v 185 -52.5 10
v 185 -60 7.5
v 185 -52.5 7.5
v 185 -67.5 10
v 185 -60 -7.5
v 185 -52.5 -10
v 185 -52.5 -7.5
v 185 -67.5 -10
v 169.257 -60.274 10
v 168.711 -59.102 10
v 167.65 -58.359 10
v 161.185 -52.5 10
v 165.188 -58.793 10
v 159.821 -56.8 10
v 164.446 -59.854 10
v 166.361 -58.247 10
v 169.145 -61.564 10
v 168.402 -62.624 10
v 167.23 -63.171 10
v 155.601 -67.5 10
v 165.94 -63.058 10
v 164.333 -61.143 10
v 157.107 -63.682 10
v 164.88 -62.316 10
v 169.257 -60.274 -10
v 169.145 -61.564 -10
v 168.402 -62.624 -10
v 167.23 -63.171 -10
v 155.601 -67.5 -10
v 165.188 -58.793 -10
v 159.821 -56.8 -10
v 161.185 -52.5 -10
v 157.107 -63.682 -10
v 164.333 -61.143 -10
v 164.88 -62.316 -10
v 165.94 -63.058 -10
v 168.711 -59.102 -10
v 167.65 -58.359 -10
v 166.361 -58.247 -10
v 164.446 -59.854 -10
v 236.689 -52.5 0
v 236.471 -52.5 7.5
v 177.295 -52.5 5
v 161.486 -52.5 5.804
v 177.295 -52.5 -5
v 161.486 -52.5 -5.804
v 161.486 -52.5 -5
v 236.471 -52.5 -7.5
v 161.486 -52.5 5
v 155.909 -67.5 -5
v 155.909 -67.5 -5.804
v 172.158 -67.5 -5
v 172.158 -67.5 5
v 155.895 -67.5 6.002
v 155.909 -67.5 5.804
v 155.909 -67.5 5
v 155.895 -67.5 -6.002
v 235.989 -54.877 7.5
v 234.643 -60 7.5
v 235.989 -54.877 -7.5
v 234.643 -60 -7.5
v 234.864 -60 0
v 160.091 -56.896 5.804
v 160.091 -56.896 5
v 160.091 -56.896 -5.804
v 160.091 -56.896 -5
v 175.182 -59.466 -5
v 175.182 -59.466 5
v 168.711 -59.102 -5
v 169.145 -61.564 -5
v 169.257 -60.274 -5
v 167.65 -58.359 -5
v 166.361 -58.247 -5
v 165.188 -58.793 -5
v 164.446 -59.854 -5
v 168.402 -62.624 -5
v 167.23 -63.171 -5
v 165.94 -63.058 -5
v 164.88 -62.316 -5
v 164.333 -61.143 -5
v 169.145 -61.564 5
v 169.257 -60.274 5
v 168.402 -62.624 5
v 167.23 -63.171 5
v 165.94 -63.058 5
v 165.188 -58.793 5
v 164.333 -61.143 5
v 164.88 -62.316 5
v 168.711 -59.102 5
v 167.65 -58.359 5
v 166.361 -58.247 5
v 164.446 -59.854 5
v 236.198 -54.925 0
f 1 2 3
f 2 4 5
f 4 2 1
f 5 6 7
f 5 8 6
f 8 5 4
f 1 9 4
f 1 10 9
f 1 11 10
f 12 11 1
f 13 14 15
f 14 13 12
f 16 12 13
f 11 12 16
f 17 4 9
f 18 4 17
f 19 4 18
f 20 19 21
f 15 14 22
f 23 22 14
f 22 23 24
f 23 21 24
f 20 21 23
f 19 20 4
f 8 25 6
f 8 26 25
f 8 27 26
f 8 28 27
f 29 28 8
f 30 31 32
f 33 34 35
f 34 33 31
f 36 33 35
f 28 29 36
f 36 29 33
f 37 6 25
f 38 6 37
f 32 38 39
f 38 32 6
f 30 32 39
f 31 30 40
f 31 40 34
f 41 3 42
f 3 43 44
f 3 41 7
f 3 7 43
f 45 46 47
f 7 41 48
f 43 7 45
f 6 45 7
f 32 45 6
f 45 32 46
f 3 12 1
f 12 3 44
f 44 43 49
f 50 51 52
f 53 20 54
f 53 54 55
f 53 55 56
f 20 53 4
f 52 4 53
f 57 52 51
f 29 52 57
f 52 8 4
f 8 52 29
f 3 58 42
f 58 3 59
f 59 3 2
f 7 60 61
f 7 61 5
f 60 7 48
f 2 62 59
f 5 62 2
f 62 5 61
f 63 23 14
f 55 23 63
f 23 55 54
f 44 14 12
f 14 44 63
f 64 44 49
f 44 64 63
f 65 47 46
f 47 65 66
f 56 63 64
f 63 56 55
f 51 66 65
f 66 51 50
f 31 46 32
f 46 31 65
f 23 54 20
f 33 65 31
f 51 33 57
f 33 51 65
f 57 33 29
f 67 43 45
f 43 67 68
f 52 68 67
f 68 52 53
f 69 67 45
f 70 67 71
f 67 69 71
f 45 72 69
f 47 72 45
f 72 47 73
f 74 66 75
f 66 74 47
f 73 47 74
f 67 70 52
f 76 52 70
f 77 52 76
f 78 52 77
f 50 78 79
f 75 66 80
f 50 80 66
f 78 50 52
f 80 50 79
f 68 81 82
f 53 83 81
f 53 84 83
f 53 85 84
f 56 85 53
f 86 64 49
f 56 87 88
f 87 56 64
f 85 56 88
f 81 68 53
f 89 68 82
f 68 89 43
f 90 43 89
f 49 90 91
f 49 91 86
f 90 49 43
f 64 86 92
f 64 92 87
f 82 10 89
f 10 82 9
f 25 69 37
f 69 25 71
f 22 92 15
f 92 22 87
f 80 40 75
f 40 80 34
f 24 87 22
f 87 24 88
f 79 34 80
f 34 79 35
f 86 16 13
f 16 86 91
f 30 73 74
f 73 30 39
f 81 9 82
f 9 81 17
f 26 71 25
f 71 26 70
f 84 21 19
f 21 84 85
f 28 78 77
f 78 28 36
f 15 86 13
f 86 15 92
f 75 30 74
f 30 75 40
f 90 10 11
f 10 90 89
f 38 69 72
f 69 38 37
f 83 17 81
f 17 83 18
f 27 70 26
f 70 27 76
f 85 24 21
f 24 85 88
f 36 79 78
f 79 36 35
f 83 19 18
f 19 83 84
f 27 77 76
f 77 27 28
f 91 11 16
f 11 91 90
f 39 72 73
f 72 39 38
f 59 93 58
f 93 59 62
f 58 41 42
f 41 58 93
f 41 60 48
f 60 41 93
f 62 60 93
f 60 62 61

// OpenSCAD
// file: ../motors/MN5212.scad
use <../utils.scad>

module MN5212(){

	render(){
		translate([0,0, 42.5 / 2 - 23 / 2 - 4.9 - 6])
			cylinder(
				h = 23,
				r = 59 / 2,
				$fa = fa(59 / 2),
				center = true);
		translate([0,0, 42.5 / 2 - 4.9 / 2 - 6])
			cylinder(
				h = 4.9,
				r1 = 59 / 2,
				r2 = 24.8 / 2,
				$fa = fa(59 / 2),
				center = true);
		translate([0,0, - 42.5 / 2 + 5.6 / 2 + 3])
			cylinder(
				h = 5.6,
				r1 = 44 / 2,
				r2 = 59 / 2,
				$fa = fa(59 / 2),
				center = true);
		translate([0, 0, 42.5 / 2 - 3])
			cylinder(
				h = 6,
				r = 4 / 2,
				$fa = fa(4 / 2),
				center = true);
		translate([0, 0, - 42.5 / 2 + 1.5])
			cylinder(
				h = 3,
				r = 6 / 2,
				$fa = fa(6 / 2),
				center = true);
	}

}
// file: ../servos/HS_5065MG.scad
use <../utils.scad>

module HS_5065MG(){

	length = 23.75;
	width = 11.68;
	depth = 20.32;
	wing_width = 32.38;
	wing_thick = 3.43;
	shaft_offset = 6;
	hole_spacing = 28.32;
	shaft_height = 26.16;
	shaft_length = 2;

	module mounting_hole(){
		mh_rad = 2 / 2;
		translate(
			[
				hole_spacing / 2,
				0,
				depth / 2 - wing_thick / 2
			])
			cylinder(h = 5, r = mh_rad, $fa = fa(mh_rad), center = true);
	}

	difference(){
		union(){
			cube([length, width, depth], center = true);
			translate([0, 0, depth / 2 - wing_thick / 2])
				cube([wing_width, width, wing_thick], center = true);
			translate(
				[
					- length / 2 + shaft_offset,
					0,
					shaft_height - length / 2 + shaft_length / 2
				])
				cylinder(
					h = shaft_length,
					r = 1.5,
					$fa = fa(1.5),
					center = true);
		}	union(){

			mounting_hole();
			mirror() mounting_hole();
		}
	}
}

HS_5065MG();
// file: ../servos/LS_0006_servo.scad
// Author Michael Marques (DrYerzinia)

use <../utils.scad>

module ls_0006_servo(){
	
	length = 21.4;
	depth = 19.9;
	thickness = 11.65;

	gear_height = 2.6;
	gear_bump_height = 0.7;
	gear_bump_diameter = 1.97;
	gear_outer_bump_diameter = 6;
	gear_bump_offset = 12.2;

	shaft_height = 2.4;
	shaft_diameter = 3.74;
	shaft_offset = thickness / 2;
	shaft_screw_diameter = 1.3;
	
	wing_outer_width = 8.5;
	wing_top_off = 3.8;
	wing_length = 3.8;
	wing_thickness = 1.2;
	wing_hole_diameter = 1.85;
	wing_hole_edge_dist = 2;

	module wing_hole(){
		translate(
			[
				length / 2 + wing_hole_edge_dist,
				0,
				depth/2 - wing_top_off - wing_thickness / 2
			])
			cylinder(
				h = wing_thickness + 1,
				r = wing_hole_diameter / 2,
				$fn = 16,
				center = true);
	}

	module wing(){
		translate(
			[
				length / 2,
				thickness / 2,
				depth/2 - wing_top_off - wing_thickness
			])
			rotate([0,0,-90])
				trapezoid(
					thickness,
					wing_outer_width,
					wing_length,
					wing_thickness);
	}

	// Body
	cube([length, thickness, depth], center = true);

	difference(){
		union(){

			wing();
			mirror() wing();

			// Gear Bumps
			translate([0, 0, depth/2 + gear_height / 2]){
				translate([length / 2 - gear_bump_offset, 0, 0])
					cylinder(
						h = gear_height,
						r = gear_outer_bump_diameter / 2,
						$fn = 16,
						center = true);
				translate([length / 2 - gear_bump_offset, 0, gear_height/2 + gear_bump_height / 2])
					cylinder(
						h = gear_bump_height,
						r = gear_bump_diameter / 2,
						$fn = 16,
						center = true);
				translate([length / 2 - shaft_offset, 0, 0])
					cylinder(
						h = gear_height,
						r = thickness / 2,
						$fn = 32,
						center = true);
				// Shaft
				translate([length / 2 - shaft_offset, 0, gear_height])
					cylinder(
						h = shaft_height,
						r = shaft_diameter / 2,
						$fn = 16,
						center = true);
			}

		}
		union(){

			wing_hole();
			mirror() wing_hole();

			// Shaft_hole
			translate(
				[
					length / 2 - shaft_offset,
					0,
					depth/2 + gear_height * (3 / 2) + 0.5])
				cylinder(
					h = shaft_height + 1,
					r = shaft_screw_diameter / 2,
					$fn = 16,
					center = true);

		}
	}

}

module translate_ls_0006_attachment(){

	length = 21.4;
	thickness = 11.65;
	shaft_offset = thickness / 2;
	depth = 19.9;
	float = 3.3;

	translate([length / 2 - shaft_offset, 0, depth / 2 + float])
		children();

}

module bar_attachment(){

	height = 3.75;
	bar_length = 14.7;
	bar_thickness = 1.6;
	inner_radius = 5.9;
	outer_radius = 3.95;
	shaft_diameter = 3.7;
	upper_void_diameter = 4.8;
	screw_diameter = 2;
	hole_spacing = 2;
	hole_4_diameter = 1.2;
	hole_diameter = 1;
	hole_start_off = 4.7;
	top_void_depth = 0.67;
	bottom_void_depth = 1.84;

	translate([0, 0, height / 2]){
		difference(){
			union(){

				translate([0, inner_radius / 2, height / 2 - bar_thickness])
					rotate([0,0,-90])
						trapezoid(
							inner_radius,
							outer_radius,
							bar_length,
							bar_thickness);

				cylinder(
					h = height,
					r = inner_radius / 2,
					$fn = 16,
					center = true);

				translate([bar_length, 0, height / 2 - bar_thickness / 2])
					cylinder(
						h = bar_thickness,
						r = outer_radius / 2,
						$fn = 16,
						center = true);

			}
			union(){
				// screwhole
				cylinder(
					h = height + 1,
					r = screw_diameter / 2,
					$fn = 16,
					center = true);
				// voids
				translate([0, 0, height / 2 - top_void_depth / 2 + 0.5])
					cylinder(
						h = top_void_depth + 1,
						r = upper_void_diameter / 2,
						$fn = 16,
						center = true);
				translate([0, 0,  - bottom_void_depth / 2 - 0.5])
					cylinder(
						h = bottom_void_depth + 1,
						r = shaft_diameter / 2,
						$fn = 16,
						center = true);

				for(i = [0:4]){
					dia = (i != 3) ? hole_diameter : hole_4_diameter;
					translate(
						[
							hole_start_off + hole_spacing * i,
							0,
							height / 2 - bar_thickness / 2])
						cylinder(
							h = bar_thickness + 1,
							r = dia / 2,
							$fn = 16,
							center = true);
				}

			}
		}
	}

}

ls_0006_servo();
translate_ls_0006_attachment() bar_attachment();
// file: ../servos/parallax_continuous_rotation_servo.scad
// Author Michael Marques (DrYerzinia)

module parallax_continuous_rotation_servo(){

	depth = 37.7;
	length = 40.75;
	width = 19.75;

	mount_height = 2.7;
	mount_extent = 6.1;
	mount_from_top = 7.7;

	mount_hole_diameter = 4.46;
	mount_hole_spacing = 14.4 - mount_hole_diameter;

	shaft_diameter = 5.8;
	shaft_offset = 10;
	shaft_length = 3.5;

	module mounting_hole(){

			translate(
				[
					length / 2 + 5,
					mount_hole_spacing / 2,
					depth / 2 - mount_height / 2 - mount_from_top
				]
				)
				cylinder(
					h = mount_height + 1,
					r = mount_hole_diameter / 2,
					$fn=16,
					center = true);
	}

	difference(){
		union(){

			// Body
			cube([length,width,depth], center = true);

			// Mounting wings
			translate(
				[
					0,
					0,
					depth / 2 - mount_height / 2 - mount_from_top
				])
				cube(
					[
						length + mount_extent * 2,
						width,
						mount_height
					],
					center = true);

			// Shaft
			translate(
				[
					length / 2 - shaft_offset,
					0,
					depth / 2 + shaft_length / 2
				]
				)
				cylinder(
					h = shaft_length,
					r = shaft_diameter / 2,
					$fn = 16,
					center = true
				);

		}
		union(){

			// Mounting Holes
			mounting_hole();
			mirror()
				mounting_hole();

			translate([0,-mount_hole_spacing,0]){
				mounting_hole();
				mirror()
					mounting_hole();
			}
		}
	}

}

module translate_shaft(){

	depth = 37.7;
	length = 40.75;

	shaft_offset = 10;

	translate(
		[
			length / 2 - shaft_offset,
			0,
			depth / 2
		])
		children();
}

module round_servo_attachment(){

	height = 6;
	diameter = 20.8;
	inner_diameter = 8.6;
	plate_thickness = 2.45;

	float = 2;

	depth = 37.7;
	length = 40.75;

	shaft_offset = 10;

	plate_hole_spacing = 14.5;
	plate_hole_diameter = 1.4;
	plate_hole_minor_spacing = 3.5;

	screw_hole_diameter = 3;

	inner_diameter = 8;
	
	top_depth = 1.8;
	bottom_depth = 3.4;

	void_diameter = 5.8;

	module plate_hole(){
		cylinder(
			h = plate_thickness + 1,
			r = plate_hole_diameter / 2,
			$fn = 16,
			center = true
		);
	}

	module plate_hole_group(){
		translate([0, 0, height / 2 - plate_thickness / 2]){
			translate([0, plate_hole_spacing / 2, 0]){
					plate_hole();
					translate([- plate_hole_minor_spacing, 0, 0])
						plate_hole();
					translate([  plate_hole_minor_spacing, 0, 0])
						plate_hole();
			}
		}
	}

	translate(
		[
			length / 2 - shaft_offset,
			0,
			depth / 2 + height / 2 + float
		]
		)
		difference(){

			union(){

				// inner shaft
				cylinder(
					h = height,
					r = inner_diameter / 2,
					$fn = 16,
					center = true
				);

				// top
				translate([0, 0, height / 2 - plate_thickness / 2])
					cylinder(
						h = plate_thickness,
						r = diameter / 2,
						$fn = 32,
						center = true
					);
			}

			union(){

				// plate holes
				for(ang = [0:3]){
					rotate([0,0, ang * 90])
						plate_hole_group();
				}

				// screw hole
				cylinder(
					h = height + 1,
					r = screw_hole_diameter / 2,
					$fn = 16,
					center = true
				);

				// inner voids
				translate([0, 0, height / 2 - top_depth / 2 + 1])
					cylinder(
						h = top_depth + 1,
						r = void_diameter / 2,
						$fn = 16,
						center = true
					);
				translate([0, 0, -1])
					cylinder(
						h = bottom_depth + 1,
						r = void_diameter / 2,
						$fn = 16,
						center = true
					);

			}

		}

}

parallax_continuous_rotation_servo();
round_servo_attachment();
// file: ../hardware.scad
 // Author Michael Marques (DrYerzinia)

// http://www.ebay.com/itm/10-PCS-683-3x7x2-mm-Metal-OPEN-PRECISION-Miniature-Ball-Bearing-3-7-2-/291206307942?hash=item43cd3fa066:m:mCi6eovrGVk_CjIUjlhw8yg
// E-Bay empire.rc

module washer_M3_7x3_2x0_5mm(){

	difference(){
		cylinder(
			h = 0.5,
			r = 7 / 2,
			$fn = 16,
			center = true);
		cylinder(
			h = 0.5 + 0.1,
			r = 3.2 / 2,
			$fn = 16,
			center = true);
	}

}

module bearing_3x7x2mm(){

	difference(){
		cylinder(
			h = 2,
			r = 7 / 2,
			$fn = 16,
			center = true);
		cylinder(
			h = 2 + 1,
			r = 3 / 2,
			$fn = 16,
			center = true);
	}

}

module bearing_5x8x2_5mm(){

	difference(){
		cylinder(
			h = 2.5,
			r = 8 / 2,
			$fn = 16,
			center = true);
		cylinder(
			h = 2.5 + 1,
			r = 5 / 2,
			$fn = 16,
			center = true);
	}

}

module bearing_8x16x5mm(){

	difference(){
		cylinder(
			h = 5,
			r = 16 / 2,
			$fn = 16,
			center = true);
		cylinder(
			h = 5 + 1,
			r = 8 / 2,
			$fn = 16,
			center = true);
	}

}


bearing_5x8x2_5mm();
// file: ../utils.scad
// http://forum.openscad.org/Creating-pie-pizza-slice-shape-need-a-dynamic-length-array-td3148.html

module pie_slice(r, start_angle, end_angle) {
    R = r * sqrt(2) + 1;
    a0 = (4 * start_angle + 0 * end_angle) / 4;
    a1 = (3 * start_angle + 1 * end_angle) / 4;
    a2 = (2 * start_angle + 2 * end_angle) / 4;
    a3 = (1 * start_angle + 3 * end_angle) / 4;
    a4 = (0 * start_angle + 4 * end_angle) / 4;
    if(end_angle > start_angle)
        intersection() {
        circle(r, $fa = fa(r));
        polygon([
            [0,0],
            [R * cos(a0), R * sin(a0)],
            [R * cos(a1), R * sin(a1)],
            [R * cos(a2), R * sin(a2)],
            [R * cos(a3), R * sin(a3)],
            [R * cos(a4), R * sin(a4)],
            [0,0]
       ]);
    }
}

// https://github.com/openscad/openscad/issues/29

module rotate_about(v,a) {
	translate(v) rotate(a) translate(-v) children(0);
}

module rotate_about_axis(v, ang, axis) {
	translate(v) rotate(ang, axis) translate(-v) children(0);
}

// https://github.com/robofun/openscad-utils/blob/master/trapezoid.scad

module trapezoid(width_base, width_top,height,thickness) {
	

  linear_extrude(height = thickness) polygon(points=[[0,0],[width_base,0],[width_base-(width_base-width_top)/2,height],[(width_base-width_top)/2,height]], paths=[[0,1,2,3]]); 
  
}

// http://forum.openscad.org/fe-Tolerance-based-arc-approximation-td14212.html

function fa(r)=($fn>0)?360/$fn:($fe>0)?($fe<r)?min(45,2*acos(1-$fe/r)):45:$fa; 
// file: ../render_settings.scad
// Author Michael Marques (DrYerzinia)

// Lulzbot Mini tolerances
// x/y 0.1mm
// z   0.05mm
//
// 0.1mm   preview tolerance
// 0.025mm export  tolerance

$fs = 0.01;
$fn = undef;
$fa = 360 / 5;

$fe = 0.025;	// export
// main file
// Author Michael Marques (DrYerzinia)

include <../render_settings.scad>

use <../BB8.scad>

Door_P7_middle_door_brace();
